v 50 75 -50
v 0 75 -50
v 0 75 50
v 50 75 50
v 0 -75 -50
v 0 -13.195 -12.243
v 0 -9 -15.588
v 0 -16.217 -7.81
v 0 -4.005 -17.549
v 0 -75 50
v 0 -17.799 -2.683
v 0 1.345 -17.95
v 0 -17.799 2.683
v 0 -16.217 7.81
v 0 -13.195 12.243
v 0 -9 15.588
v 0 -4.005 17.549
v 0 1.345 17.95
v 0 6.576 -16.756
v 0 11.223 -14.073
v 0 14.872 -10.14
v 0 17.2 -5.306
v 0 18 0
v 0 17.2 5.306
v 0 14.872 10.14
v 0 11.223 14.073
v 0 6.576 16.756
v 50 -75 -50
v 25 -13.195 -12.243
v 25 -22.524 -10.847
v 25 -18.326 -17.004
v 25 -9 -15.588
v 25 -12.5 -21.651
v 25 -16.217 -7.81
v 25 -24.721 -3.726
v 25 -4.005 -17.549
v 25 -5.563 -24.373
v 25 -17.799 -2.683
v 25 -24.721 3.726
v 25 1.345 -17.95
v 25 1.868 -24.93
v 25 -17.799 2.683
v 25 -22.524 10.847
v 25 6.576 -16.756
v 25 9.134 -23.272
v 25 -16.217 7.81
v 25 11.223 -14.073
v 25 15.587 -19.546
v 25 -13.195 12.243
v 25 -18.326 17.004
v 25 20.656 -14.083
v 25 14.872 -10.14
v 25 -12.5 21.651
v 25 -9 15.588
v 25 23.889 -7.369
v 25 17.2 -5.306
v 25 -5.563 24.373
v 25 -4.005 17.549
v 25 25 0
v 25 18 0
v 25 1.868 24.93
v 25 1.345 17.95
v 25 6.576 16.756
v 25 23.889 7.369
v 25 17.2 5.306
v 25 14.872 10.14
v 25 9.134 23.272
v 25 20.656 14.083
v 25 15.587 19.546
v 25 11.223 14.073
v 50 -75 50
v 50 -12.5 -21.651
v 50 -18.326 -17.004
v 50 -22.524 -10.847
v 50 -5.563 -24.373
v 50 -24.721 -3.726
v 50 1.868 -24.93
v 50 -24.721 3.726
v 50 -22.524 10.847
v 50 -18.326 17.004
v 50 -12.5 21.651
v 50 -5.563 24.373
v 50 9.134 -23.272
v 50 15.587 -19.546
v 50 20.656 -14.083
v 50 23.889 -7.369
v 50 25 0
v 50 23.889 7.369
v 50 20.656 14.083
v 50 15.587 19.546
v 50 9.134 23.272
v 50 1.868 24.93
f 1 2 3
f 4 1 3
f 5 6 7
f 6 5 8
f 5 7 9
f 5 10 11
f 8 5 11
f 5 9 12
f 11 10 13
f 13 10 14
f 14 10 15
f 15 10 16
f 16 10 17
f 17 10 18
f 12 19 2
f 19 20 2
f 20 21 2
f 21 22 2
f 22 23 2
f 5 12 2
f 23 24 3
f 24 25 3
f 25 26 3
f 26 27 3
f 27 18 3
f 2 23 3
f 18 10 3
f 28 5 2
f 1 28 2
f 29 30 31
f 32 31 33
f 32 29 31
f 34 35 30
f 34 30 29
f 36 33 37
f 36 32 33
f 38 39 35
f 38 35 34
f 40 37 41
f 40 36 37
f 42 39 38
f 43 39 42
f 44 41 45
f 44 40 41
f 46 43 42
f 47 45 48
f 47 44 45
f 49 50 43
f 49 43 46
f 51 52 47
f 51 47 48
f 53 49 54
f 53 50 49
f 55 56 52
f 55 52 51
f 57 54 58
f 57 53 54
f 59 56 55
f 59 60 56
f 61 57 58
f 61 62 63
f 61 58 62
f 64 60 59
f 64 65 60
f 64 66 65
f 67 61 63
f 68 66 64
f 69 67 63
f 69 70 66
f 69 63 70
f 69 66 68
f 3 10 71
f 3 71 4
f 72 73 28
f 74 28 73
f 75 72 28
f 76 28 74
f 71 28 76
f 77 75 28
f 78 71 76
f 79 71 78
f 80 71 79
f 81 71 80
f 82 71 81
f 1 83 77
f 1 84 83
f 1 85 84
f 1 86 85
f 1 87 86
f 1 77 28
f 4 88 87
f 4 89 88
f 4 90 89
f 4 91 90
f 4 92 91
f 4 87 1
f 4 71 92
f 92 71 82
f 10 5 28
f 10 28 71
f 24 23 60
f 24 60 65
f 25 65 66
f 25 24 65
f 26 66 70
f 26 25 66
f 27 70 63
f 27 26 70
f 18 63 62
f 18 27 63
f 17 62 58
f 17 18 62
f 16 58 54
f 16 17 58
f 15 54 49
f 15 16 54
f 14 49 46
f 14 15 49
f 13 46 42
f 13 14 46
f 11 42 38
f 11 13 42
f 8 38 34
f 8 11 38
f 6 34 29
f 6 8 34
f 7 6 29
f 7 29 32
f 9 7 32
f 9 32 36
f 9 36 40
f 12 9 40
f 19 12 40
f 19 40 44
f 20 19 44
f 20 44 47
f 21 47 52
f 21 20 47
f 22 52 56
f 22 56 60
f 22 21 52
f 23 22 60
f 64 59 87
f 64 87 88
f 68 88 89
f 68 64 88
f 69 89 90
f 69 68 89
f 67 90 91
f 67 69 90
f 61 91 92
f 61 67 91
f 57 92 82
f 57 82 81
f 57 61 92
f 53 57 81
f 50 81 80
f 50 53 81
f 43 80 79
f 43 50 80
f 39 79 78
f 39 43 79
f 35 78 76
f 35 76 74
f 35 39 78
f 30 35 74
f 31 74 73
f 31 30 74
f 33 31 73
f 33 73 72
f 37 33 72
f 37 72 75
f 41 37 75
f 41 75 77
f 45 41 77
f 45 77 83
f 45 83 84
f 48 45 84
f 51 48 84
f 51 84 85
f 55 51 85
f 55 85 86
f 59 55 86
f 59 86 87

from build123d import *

# Parameters (mm, degrees)
F0_W     = 150
F0_H     = 100
F0_R     = 25
F0_R_2   = 18
F1_DEPTH = 25
F2_DEPTH = 50


with BuildPart() as f1:
    # F0 (on Right) → F1 (new body)
    with BuildSketch(Plane.YZ):
        Rectangle(F0_W, F0_H)
        Circle(F0_R, mode=Mode.SUBTRACT)
        Circle(F0_R)
        Circle(F0_R_2, mode=Mode.SUBTRACT)
    extrude(amount=F1_DEPTH)

    # F0 (on Right) → F2 (join)
    with BuildSketch(Plane.YZ):
        Rectangle(F0_W, F0_H)
        Circle(F0_R, mode=Mode.SUBTRACT)
    extrude(amount=F2_DEPTH)


solid = f1.part
